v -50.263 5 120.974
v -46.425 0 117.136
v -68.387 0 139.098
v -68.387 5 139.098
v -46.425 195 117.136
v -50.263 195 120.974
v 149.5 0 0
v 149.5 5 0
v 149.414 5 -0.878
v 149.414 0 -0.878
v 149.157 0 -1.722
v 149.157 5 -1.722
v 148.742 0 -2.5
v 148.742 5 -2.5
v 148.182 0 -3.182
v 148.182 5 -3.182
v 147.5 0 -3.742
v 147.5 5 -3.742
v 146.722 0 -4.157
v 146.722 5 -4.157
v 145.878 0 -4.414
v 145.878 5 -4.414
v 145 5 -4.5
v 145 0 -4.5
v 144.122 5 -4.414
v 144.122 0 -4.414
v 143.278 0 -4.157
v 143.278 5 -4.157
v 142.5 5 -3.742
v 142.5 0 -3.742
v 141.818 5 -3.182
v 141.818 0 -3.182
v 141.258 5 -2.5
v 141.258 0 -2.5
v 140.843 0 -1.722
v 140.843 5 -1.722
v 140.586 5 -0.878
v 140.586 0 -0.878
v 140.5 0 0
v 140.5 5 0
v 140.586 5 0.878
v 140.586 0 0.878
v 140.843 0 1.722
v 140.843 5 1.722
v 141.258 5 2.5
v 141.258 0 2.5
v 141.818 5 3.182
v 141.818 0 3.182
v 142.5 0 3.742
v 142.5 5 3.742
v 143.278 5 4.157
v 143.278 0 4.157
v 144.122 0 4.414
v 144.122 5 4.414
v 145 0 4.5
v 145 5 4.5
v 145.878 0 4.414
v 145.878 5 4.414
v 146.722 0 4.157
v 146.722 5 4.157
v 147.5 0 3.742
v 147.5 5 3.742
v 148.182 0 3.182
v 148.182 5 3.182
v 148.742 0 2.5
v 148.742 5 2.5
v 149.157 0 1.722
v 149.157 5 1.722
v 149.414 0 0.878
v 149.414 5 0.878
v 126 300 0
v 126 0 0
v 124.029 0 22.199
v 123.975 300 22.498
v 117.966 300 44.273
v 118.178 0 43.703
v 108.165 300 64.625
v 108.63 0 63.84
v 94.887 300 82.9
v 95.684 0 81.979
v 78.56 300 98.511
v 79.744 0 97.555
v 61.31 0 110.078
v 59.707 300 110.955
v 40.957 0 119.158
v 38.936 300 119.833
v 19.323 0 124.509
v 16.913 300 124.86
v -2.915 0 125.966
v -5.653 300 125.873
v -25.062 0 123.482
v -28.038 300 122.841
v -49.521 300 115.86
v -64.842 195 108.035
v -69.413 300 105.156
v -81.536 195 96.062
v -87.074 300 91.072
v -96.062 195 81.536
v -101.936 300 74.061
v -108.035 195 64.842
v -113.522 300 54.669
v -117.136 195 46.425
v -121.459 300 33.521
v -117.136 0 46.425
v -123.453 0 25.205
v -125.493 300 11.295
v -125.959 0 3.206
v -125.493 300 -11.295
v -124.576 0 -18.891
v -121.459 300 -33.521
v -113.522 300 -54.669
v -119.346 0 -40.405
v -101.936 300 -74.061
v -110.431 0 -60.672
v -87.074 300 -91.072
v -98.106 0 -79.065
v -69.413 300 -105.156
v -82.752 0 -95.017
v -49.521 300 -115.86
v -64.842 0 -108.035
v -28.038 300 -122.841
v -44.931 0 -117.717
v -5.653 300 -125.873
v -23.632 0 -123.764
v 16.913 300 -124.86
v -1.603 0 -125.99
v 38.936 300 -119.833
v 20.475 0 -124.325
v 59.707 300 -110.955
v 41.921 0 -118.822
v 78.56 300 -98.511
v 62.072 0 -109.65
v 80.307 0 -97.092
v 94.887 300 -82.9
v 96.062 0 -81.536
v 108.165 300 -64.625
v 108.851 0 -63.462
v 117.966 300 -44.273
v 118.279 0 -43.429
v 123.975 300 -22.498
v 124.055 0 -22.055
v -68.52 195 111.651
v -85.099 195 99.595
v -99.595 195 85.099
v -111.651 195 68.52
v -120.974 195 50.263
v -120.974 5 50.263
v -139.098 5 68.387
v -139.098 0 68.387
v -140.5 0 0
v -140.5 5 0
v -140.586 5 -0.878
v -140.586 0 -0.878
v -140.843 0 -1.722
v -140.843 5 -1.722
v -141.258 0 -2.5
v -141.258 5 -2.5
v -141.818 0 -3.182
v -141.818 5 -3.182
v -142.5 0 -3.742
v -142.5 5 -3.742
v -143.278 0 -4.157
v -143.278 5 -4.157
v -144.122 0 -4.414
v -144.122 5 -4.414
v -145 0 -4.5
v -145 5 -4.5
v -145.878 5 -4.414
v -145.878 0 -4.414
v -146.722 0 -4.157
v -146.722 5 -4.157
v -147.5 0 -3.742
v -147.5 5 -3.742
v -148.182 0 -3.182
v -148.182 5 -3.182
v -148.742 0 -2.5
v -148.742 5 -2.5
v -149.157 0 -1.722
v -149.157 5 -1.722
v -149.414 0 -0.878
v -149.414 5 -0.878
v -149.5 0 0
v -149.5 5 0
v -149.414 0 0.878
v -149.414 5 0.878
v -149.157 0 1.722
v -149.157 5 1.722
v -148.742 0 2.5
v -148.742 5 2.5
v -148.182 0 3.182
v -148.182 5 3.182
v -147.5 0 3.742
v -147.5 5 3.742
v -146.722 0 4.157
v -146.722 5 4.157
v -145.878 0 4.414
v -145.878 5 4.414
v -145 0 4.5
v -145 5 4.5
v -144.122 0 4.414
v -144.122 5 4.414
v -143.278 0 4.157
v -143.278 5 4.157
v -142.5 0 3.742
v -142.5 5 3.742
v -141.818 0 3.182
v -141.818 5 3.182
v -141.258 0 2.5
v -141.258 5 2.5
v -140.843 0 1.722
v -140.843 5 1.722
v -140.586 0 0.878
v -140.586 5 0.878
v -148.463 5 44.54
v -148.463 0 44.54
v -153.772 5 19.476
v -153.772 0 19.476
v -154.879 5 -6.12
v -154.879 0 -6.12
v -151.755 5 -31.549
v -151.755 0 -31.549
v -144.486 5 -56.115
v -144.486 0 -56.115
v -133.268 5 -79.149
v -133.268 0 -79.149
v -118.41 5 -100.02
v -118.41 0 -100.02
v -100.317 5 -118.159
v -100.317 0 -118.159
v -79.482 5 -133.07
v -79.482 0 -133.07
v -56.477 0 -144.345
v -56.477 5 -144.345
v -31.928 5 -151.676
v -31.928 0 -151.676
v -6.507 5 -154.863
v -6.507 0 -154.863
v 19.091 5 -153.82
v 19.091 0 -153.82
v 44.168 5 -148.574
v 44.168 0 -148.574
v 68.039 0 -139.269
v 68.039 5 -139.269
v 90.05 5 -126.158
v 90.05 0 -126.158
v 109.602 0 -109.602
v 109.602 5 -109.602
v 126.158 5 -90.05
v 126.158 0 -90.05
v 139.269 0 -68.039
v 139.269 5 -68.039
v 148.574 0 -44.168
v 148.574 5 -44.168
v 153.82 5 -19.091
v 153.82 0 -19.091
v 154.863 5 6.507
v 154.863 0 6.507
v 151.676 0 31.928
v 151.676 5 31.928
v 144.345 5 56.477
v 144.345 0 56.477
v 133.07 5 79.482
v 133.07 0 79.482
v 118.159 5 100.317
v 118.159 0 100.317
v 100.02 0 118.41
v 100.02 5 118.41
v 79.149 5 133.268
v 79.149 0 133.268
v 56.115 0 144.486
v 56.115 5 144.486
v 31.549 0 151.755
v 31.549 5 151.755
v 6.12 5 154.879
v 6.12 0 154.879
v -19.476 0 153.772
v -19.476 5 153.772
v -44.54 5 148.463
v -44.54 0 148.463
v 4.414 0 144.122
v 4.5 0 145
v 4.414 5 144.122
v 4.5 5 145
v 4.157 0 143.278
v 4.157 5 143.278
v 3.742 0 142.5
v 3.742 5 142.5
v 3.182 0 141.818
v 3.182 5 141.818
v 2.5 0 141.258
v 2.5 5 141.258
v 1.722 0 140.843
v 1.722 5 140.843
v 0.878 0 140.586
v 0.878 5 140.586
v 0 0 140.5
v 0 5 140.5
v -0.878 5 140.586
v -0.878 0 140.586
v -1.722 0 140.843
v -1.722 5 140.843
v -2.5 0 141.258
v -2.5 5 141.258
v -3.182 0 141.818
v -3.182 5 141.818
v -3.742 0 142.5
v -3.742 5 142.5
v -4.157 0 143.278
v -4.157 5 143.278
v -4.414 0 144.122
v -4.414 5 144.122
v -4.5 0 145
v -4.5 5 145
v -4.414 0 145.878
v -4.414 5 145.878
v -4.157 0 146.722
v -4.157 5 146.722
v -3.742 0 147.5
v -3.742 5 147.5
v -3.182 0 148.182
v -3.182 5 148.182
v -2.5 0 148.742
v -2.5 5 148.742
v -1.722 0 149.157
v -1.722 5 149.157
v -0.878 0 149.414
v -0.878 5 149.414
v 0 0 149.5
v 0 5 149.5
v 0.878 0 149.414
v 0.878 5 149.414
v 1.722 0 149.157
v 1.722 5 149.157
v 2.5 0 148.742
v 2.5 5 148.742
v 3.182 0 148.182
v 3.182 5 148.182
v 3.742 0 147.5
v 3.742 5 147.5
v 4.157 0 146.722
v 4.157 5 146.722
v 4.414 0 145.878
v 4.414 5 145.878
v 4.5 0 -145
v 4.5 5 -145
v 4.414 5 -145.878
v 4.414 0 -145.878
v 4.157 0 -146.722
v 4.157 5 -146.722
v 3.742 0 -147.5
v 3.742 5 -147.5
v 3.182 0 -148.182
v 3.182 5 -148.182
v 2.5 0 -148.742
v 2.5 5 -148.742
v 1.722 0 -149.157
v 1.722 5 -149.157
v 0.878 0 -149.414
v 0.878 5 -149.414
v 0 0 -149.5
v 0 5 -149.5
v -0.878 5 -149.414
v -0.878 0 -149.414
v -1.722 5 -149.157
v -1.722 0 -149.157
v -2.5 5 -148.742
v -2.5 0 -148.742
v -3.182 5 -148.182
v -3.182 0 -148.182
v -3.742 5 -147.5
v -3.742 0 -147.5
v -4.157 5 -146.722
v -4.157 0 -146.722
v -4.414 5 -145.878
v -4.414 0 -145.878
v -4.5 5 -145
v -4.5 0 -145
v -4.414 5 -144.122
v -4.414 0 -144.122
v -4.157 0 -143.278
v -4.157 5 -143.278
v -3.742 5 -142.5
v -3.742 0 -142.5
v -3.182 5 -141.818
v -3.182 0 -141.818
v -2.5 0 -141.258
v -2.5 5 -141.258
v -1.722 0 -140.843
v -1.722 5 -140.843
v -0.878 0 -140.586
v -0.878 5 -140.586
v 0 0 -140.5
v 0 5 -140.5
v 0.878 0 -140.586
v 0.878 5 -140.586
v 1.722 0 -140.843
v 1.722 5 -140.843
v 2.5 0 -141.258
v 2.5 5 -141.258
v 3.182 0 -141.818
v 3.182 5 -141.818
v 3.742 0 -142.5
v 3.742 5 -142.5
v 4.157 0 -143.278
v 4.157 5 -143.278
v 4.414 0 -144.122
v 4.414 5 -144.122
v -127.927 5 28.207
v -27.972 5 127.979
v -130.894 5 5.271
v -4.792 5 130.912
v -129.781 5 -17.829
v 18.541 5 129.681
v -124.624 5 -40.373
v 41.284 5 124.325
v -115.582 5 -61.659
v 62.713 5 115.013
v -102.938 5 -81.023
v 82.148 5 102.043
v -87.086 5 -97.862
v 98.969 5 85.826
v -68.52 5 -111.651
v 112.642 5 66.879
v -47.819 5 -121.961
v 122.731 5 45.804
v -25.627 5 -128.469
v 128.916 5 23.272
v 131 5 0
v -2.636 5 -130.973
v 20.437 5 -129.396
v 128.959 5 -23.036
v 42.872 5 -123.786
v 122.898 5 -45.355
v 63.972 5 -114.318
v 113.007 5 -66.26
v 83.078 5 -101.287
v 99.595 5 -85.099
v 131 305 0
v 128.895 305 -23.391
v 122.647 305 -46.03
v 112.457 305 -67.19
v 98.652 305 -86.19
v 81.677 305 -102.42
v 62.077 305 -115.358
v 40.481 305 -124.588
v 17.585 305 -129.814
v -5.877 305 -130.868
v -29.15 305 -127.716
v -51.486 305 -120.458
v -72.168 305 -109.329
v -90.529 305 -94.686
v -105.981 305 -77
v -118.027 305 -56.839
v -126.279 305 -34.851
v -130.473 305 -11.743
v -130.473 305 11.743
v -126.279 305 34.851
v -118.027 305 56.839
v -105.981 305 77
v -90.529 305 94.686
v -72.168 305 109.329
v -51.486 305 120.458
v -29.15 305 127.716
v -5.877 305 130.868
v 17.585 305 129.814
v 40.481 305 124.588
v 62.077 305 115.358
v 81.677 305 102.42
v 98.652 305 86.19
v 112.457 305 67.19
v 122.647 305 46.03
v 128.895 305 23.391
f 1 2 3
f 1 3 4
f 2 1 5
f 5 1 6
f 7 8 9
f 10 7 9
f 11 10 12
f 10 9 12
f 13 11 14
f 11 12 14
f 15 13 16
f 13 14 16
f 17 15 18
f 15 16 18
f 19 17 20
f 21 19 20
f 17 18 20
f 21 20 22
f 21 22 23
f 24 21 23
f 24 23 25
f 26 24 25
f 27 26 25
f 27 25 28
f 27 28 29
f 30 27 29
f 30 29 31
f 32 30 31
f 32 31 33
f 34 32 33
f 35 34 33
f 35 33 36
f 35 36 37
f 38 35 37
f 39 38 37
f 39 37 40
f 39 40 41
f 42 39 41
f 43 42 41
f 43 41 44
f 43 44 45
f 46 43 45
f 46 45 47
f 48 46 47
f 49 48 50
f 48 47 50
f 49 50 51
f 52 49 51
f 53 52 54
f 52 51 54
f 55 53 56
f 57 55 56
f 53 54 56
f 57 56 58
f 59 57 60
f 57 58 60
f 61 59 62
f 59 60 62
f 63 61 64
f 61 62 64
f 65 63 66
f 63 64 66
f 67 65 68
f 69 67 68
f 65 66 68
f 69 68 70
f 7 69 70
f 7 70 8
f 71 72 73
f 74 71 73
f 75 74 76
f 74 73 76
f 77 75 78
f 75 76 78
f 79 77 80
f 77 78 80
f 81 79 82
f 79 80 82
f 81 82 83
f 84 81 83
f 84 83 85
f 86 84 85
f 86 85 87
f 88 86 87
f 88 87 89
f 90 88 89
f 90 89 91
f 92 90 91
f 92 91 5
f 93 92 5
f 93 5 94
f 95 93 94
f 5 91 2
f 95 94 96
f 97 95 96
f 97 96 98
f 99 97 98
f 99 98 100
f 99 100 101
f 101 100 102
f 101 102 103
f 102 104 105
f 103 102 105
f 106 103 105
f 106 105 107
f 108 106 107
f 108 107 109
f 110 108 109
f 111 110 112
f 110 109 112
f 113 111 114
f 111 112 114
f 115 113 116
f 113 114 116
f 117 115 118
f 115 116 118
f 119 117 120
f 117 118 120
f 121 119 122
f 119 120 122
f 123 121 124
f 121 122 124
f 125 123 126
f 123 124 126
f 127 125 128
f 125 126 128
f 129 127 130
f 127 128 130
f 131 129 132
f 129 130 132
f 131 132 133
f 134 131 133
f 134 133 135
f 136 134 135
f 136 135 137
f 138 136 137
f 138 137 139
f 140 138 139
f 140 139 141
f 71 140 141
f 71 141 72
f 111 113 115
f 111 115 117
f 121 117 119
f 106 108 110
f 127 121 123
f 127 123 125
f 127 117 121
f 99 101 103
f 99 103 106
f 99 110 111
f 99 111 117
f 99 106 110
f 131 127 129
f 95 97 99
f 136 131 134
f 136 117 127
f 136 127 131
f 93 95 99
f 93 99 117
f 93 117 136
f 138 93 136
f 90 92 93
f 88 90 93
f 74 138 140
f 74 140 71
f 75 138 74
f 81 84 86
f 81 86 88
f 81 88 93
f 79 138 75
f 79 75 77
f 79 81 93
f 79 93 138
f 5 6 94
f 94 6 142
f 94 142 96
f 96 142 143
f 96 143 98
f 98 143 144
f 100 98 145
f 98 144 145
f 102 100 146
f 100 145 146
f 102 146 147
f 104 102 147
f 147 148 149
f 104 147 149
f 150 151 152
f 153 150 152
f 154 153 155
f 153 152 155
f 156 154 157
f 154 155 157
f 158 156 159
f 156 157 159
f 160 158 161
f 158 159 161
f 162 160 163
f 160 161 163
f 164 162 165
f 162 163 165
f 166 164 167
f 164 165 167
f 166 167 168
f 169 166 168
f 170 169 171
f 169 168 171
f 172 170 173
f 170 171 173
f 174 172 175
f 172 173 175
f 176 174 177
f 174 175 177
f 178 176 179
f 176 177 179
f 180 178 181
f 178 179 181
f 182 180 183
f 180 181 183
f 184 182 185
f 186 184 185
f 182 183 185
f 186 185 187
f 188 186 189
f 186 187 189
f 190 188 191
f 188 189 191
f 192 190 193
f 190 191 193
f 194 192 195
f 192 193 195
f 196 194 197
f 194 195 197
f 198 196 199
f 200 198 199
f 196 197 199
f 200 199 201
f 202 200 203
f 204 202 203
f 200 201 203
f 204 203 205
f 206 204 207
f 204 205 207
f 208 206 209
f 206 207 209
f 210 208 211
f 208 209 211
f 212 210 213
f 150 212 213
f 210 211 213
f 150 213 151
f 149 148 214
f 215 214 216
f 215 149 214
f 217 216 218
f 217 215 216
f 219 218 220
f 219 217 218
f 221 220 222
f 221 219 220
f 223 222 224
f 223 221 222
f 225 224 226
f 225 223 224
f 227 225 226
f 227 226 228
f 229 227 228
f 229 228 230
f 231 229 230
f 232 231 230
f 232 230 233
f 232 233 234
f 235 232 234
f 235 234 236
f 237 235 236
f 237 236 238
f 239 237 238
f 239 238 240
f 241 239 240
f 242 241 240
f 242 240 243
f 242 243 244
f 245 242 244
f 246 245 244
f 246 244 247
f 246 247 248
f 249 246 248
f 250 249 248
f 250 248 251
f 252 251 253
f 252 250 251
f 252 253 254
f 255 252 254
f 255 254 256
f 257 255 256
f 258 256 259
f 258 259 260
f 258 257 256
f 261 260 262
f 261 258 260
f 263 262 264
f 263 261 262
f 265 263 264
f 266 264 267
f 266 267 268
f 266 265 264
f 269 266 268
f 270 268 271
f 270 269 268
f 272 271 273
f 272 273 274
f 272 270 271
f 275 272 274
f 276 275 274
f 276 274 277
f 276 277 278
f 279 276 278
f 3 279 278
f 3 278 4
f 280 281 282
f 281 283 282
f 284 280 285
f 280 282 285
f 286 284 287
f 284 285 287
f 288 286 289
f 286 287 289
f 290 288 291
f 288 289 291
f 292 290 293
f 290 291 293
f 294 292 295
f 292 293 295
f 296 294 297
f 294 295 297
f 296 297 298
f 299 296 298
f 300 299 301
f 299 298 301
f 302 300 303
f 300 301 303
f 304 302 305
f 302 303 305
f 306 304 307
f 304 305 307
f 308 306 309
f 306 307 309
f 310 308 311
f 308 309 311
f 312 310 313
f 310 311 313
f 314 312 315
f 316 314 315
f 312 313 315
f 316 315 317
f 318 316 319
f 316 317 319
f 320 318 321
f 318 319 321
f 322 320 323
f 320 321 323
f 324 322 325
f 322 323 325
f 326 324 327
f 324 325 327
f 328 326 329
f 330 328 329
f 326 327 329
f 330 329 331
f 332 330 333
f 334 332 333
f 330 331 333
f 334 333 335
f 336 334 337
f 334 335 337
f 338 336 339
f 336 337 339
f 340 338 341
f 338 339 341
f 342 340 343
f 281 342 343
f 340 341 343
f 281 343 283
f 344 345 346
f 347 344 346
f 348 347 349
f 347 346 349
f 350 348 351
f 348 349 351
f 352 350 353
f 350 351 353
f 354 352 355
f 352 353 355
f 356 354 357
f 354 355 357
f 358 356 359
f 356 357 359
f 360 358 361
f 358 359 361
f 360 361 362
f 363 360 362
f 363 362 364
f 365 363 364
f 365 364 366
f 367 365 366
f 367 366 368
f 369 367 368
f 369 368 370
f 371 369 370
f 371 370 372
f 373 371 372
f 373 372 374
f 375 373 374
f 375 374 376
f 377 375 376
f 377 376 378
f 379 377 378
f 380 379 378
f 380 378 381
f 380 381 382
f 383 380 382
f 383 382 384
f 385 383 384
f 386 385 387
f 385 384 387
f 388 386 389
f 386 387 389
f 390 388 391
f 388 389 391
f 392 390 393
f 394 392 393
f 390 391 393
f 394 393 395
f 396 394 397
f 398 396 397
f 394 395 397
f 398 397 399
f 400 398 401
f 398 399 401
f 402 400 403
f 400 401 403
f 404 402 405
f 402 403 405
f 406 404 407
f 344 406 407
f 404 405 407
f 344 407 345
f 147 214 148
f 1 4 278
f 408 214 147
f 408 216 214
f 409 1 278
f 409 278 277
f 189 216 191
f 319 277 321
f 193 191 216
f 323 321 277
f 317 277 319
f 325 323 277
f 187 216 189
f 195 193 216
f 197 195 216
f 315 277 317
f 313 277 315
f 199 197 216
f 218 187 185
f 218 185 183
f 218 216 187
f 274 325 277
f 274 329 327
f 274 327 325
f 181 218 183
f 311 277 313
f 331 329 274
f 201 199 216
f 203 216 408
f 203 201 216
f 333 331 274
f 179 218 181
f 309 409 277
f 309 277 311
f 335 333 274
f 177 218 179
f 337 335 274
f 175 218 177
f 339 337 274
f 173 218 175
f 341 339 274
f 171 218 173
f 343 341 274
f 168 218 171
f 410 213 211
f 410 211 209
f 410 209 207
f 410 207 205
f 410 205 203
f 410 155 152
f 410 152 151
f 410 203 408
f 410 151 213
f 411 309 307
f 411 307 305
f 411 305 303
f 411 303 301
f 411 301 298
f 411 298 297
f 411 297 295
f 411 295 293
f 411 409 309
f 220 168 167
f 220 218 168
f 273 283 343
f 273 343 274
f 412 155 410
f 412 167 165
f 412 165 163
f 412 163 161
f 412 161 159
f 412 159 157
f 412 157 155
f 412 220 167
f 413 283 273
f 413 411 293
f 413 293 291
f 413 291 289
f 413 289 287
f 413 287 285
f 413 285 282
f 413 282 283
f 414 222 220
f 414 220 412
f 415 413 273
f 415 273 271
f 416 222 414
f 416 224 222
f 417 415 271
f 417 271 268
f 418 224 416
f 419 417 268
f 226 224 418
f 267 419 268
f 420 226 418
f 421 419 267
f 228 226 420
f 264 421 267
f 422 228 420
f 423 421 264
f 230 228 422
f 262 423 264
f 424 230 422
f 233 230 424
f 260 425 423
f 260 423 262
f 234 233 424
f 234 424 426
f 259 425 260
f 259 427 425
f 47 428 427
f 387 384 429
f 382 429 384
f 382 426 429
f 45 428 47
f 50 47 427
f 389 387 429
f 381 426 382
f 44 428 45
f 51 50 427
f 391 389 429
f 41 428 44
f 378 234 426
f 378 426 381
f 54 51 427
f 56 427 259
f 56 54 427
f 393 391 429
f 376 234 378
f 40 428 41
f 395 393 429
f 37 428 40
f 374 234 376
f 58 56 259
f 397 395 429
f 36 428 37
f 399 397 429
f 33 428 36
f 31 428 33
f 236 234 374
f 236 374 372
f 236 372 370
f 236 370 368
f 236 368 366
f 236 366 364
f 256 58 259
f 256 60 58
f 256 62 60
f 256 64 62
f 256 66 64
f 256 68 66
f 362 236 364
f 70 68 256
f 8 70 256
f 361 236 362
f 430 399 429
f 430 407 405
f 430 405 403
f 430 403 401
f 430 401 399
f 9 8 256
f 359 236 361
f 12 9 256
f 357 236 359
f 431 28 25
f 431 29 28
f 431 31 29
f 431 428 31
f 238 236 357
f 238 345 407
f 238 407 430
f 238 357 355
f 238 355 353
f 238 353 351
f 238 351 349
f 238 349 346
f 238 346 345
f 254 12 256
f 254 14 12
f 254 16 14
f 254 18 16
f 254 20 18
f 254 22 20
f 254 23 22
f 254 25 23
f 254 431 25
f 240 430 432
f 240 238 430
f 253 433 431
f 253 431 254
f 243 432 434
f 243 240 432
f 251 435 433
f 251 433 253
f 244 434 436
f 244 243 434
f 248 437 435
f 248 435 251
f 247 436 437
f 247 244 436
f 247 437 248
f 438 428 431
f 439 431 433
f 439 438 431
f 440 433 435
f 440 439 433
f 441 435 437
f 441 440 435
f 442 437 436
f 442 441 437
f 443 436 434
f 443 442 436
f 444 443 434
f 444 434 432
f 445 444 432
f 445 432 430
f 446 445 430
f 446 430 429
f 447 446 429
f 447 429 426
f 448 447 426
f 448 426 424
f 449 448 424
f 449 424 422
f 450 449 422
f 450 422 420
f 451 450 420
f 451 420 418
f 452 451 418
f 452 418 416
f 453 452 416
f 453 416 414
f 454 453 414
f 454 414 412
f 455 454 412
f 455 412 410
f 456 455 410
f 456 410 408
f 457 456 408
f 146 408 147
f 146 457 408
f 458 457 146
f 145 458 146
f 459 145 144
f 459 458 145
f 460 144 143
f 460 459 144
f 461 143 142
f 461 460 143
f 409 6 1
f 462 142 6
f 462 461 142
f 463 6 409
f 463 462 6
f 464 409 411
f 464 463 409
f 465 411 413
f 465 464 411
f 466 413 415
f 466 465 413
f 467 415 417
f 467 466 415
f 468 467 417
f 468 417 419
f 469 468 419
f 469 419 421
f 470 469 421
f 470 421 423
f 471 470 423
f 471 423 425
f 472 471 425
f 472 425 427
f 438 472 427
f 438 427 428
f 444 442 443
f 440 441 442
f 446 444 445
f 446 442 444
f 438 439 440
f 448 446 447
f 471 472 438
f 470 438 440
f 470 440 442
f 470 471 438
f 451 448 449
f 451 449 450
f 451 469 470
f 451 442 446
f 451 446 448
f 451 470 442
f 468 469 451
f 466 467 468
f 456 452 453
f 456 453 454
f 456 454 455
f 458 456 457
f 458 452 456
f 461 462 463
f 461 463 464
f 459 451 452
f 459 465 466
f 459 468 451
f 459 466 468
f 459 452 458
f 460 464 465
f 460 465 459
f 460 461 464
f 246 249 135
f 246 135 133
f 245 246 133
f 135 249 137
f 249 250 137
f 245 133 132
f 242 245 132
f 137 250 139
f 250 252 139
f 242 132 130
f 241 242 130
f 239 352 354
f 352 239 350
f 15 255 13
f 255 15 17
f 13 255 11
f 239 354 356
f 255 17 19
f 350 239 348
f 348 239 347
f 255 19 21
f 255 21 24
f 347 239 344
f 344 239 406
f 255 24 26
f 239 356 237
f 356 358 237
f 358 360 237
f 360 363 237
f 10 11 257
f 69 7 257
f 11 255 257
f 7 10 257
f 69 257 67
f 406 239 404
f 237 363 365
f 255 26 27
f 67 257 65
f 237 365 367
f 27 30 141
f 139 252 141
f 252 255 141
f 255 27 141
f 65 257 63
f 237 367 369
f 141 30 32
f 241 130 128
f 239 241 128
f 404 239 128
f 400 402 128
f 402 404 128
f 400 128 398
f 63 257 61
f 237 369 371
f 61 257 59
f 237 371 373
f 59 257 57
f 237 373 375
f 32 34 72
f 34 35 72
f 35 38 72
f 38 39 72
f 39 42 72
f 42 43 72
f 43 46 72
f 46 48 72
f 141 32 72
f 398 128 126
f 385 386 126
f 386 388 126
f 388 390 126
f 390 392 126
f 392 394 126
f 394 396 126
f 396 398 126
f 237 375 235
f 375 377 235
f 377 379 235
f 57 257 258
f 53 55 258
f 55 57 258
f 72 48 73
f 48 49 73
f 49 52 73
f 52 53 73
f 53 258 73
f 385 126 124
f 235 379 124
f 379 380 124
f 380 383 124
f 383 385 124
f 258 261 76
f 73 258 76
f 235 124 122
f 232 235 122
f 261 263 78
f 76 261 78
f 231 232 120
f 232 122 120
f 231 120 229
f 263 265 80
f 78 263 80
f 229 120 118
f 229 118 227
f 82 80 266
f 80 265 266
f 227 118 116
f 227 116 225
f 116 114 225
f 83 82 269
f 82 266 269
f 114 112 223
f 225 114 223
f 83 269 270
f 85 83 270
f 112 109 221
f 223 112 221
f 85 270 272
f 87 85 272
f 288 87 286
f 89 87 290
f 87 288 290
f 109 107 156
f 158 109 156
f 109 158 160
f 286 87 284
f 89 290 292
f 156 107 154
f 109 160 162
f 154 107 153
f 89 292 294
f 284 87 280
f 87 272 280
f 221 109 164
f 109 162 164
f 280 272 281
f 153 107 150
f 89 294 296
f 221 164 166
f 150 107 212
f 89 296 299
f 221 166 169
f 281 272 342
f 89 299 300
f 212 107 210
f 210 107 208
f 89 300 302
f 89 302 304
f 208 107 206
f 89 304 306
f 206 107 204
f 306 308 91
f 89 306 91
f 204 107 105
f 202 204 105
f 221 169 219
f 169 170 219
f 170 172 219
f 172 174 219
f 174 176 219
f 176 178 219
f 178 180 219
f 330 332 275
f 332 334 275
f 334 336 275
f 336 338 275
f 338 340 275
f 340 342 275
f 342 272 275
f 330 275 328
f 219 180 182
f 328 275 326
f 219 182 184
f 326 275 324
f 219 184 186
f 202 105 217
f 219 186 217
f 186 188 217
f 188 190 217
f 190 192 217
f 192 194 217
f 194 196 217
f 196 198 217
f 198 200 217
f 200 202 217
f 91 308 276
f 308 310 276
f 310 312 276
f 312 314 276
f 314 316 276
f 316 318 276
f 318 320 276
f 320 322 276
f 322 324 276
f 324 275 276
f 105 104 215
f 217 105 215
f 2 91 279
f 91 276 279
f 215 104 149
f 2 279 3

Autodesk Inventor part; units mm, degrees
ref_plane "XZ Plane" through (0, 0, 0) normal (0, 1, 0) x (-1, 0, 0)
ref_plane "XY Plane" through (0, 0, 0) normal (0, 0, 1) x (1, 0, 0)
sketch "Sketch1" plane through (0, 0, 0) normal (0, 1, 0) x (-1, 0, 0)
  circle A0 centre (0, 0) radius 155
  dimension "d0" = 310
extrude "Extrusion1" add sketch "Sketch1" along normal blind 305
sketch "Sketch2" plane through (0, 305, 0) normal (0, 1, 0) x (1, 0, 0)
  circle A0 centre (0, 0) radius 131
  circle A1 centre (0, 0) radius 155
  dimension "d3" = 262
  dimension "d4" = 310
extrude "Extrusion2" cut sketch "Sketch2" against normal blind 300
sketch "Sketch3" plane through (0, 0, 0) normal (0, -1, 0) x (1, 0, 0)
  circle A0 centre (0, 0) radius 126
  dimension "d7" = 252
extrude "Extrusion3" cut sketch "Sketch3" against normal blind 300
sketch "Sketch4" plane through (0, 5, 0) normal (0, 1, 0) x (1, 0, 0)
  circle A0 centre (0, 0) radius 155 projected
  line L0 (-155, 0) -> (-145, 0)
  line L1 (-155, 0) -> (-145, 0) construction
  circle A1 centre (-145, 0) radius 4.5
  circle A2 centre (0, -145) radius 4.5
  line L2 (0, -155) -> (0, -145)
  circle A3 centre (145, 0) radius 4.5
  line L3 (155, 0) -> (145, 0)
  circle A4 centre (0, 145) radius 4.5
  line L4 (0, 155) -> (0, 145)
  dimension "d10" = 10
  dimension "d12" = 9
  dimension "d15" = 360
extrude "Extrusion4" cut sketch "Sketch4" against normal through all contours A4 | A1 | A2 | A3
ref_plane "Work Plane2" through (-109.6016, 0, 109.6016) normal (0.7071, 0, -0.7071) x (0, 1, 0)
ref_plane "Work Plane1" through (0, 0, 0) normal (0.7071, 0, -0.7071) x (0, 1, 0)
sketch "Sketch5" plane through (-109.6016, 0, 109.6016) normal (0.7071, 0, -0.7071) x (0, 1, 0)
  line L0 (195, -50) -> (0, -50)
  line L1 (0, -50) -> (0, 50)
  line L2 (0, 50) -> (195, 50)
  line L3 (195, 50) -> (195, -50)
  line L4 (0, 155) -> (0, -155) projected
  point P0 (0, 0)
  dimension "d20" = 195
  dimension "d21" = 100
  dimension "d22" = 0
  dimension "d23" = 50
extrude "Extrusion5" cut sketch "Sketch5" along normal up to surface
properties part number "external_cover"
